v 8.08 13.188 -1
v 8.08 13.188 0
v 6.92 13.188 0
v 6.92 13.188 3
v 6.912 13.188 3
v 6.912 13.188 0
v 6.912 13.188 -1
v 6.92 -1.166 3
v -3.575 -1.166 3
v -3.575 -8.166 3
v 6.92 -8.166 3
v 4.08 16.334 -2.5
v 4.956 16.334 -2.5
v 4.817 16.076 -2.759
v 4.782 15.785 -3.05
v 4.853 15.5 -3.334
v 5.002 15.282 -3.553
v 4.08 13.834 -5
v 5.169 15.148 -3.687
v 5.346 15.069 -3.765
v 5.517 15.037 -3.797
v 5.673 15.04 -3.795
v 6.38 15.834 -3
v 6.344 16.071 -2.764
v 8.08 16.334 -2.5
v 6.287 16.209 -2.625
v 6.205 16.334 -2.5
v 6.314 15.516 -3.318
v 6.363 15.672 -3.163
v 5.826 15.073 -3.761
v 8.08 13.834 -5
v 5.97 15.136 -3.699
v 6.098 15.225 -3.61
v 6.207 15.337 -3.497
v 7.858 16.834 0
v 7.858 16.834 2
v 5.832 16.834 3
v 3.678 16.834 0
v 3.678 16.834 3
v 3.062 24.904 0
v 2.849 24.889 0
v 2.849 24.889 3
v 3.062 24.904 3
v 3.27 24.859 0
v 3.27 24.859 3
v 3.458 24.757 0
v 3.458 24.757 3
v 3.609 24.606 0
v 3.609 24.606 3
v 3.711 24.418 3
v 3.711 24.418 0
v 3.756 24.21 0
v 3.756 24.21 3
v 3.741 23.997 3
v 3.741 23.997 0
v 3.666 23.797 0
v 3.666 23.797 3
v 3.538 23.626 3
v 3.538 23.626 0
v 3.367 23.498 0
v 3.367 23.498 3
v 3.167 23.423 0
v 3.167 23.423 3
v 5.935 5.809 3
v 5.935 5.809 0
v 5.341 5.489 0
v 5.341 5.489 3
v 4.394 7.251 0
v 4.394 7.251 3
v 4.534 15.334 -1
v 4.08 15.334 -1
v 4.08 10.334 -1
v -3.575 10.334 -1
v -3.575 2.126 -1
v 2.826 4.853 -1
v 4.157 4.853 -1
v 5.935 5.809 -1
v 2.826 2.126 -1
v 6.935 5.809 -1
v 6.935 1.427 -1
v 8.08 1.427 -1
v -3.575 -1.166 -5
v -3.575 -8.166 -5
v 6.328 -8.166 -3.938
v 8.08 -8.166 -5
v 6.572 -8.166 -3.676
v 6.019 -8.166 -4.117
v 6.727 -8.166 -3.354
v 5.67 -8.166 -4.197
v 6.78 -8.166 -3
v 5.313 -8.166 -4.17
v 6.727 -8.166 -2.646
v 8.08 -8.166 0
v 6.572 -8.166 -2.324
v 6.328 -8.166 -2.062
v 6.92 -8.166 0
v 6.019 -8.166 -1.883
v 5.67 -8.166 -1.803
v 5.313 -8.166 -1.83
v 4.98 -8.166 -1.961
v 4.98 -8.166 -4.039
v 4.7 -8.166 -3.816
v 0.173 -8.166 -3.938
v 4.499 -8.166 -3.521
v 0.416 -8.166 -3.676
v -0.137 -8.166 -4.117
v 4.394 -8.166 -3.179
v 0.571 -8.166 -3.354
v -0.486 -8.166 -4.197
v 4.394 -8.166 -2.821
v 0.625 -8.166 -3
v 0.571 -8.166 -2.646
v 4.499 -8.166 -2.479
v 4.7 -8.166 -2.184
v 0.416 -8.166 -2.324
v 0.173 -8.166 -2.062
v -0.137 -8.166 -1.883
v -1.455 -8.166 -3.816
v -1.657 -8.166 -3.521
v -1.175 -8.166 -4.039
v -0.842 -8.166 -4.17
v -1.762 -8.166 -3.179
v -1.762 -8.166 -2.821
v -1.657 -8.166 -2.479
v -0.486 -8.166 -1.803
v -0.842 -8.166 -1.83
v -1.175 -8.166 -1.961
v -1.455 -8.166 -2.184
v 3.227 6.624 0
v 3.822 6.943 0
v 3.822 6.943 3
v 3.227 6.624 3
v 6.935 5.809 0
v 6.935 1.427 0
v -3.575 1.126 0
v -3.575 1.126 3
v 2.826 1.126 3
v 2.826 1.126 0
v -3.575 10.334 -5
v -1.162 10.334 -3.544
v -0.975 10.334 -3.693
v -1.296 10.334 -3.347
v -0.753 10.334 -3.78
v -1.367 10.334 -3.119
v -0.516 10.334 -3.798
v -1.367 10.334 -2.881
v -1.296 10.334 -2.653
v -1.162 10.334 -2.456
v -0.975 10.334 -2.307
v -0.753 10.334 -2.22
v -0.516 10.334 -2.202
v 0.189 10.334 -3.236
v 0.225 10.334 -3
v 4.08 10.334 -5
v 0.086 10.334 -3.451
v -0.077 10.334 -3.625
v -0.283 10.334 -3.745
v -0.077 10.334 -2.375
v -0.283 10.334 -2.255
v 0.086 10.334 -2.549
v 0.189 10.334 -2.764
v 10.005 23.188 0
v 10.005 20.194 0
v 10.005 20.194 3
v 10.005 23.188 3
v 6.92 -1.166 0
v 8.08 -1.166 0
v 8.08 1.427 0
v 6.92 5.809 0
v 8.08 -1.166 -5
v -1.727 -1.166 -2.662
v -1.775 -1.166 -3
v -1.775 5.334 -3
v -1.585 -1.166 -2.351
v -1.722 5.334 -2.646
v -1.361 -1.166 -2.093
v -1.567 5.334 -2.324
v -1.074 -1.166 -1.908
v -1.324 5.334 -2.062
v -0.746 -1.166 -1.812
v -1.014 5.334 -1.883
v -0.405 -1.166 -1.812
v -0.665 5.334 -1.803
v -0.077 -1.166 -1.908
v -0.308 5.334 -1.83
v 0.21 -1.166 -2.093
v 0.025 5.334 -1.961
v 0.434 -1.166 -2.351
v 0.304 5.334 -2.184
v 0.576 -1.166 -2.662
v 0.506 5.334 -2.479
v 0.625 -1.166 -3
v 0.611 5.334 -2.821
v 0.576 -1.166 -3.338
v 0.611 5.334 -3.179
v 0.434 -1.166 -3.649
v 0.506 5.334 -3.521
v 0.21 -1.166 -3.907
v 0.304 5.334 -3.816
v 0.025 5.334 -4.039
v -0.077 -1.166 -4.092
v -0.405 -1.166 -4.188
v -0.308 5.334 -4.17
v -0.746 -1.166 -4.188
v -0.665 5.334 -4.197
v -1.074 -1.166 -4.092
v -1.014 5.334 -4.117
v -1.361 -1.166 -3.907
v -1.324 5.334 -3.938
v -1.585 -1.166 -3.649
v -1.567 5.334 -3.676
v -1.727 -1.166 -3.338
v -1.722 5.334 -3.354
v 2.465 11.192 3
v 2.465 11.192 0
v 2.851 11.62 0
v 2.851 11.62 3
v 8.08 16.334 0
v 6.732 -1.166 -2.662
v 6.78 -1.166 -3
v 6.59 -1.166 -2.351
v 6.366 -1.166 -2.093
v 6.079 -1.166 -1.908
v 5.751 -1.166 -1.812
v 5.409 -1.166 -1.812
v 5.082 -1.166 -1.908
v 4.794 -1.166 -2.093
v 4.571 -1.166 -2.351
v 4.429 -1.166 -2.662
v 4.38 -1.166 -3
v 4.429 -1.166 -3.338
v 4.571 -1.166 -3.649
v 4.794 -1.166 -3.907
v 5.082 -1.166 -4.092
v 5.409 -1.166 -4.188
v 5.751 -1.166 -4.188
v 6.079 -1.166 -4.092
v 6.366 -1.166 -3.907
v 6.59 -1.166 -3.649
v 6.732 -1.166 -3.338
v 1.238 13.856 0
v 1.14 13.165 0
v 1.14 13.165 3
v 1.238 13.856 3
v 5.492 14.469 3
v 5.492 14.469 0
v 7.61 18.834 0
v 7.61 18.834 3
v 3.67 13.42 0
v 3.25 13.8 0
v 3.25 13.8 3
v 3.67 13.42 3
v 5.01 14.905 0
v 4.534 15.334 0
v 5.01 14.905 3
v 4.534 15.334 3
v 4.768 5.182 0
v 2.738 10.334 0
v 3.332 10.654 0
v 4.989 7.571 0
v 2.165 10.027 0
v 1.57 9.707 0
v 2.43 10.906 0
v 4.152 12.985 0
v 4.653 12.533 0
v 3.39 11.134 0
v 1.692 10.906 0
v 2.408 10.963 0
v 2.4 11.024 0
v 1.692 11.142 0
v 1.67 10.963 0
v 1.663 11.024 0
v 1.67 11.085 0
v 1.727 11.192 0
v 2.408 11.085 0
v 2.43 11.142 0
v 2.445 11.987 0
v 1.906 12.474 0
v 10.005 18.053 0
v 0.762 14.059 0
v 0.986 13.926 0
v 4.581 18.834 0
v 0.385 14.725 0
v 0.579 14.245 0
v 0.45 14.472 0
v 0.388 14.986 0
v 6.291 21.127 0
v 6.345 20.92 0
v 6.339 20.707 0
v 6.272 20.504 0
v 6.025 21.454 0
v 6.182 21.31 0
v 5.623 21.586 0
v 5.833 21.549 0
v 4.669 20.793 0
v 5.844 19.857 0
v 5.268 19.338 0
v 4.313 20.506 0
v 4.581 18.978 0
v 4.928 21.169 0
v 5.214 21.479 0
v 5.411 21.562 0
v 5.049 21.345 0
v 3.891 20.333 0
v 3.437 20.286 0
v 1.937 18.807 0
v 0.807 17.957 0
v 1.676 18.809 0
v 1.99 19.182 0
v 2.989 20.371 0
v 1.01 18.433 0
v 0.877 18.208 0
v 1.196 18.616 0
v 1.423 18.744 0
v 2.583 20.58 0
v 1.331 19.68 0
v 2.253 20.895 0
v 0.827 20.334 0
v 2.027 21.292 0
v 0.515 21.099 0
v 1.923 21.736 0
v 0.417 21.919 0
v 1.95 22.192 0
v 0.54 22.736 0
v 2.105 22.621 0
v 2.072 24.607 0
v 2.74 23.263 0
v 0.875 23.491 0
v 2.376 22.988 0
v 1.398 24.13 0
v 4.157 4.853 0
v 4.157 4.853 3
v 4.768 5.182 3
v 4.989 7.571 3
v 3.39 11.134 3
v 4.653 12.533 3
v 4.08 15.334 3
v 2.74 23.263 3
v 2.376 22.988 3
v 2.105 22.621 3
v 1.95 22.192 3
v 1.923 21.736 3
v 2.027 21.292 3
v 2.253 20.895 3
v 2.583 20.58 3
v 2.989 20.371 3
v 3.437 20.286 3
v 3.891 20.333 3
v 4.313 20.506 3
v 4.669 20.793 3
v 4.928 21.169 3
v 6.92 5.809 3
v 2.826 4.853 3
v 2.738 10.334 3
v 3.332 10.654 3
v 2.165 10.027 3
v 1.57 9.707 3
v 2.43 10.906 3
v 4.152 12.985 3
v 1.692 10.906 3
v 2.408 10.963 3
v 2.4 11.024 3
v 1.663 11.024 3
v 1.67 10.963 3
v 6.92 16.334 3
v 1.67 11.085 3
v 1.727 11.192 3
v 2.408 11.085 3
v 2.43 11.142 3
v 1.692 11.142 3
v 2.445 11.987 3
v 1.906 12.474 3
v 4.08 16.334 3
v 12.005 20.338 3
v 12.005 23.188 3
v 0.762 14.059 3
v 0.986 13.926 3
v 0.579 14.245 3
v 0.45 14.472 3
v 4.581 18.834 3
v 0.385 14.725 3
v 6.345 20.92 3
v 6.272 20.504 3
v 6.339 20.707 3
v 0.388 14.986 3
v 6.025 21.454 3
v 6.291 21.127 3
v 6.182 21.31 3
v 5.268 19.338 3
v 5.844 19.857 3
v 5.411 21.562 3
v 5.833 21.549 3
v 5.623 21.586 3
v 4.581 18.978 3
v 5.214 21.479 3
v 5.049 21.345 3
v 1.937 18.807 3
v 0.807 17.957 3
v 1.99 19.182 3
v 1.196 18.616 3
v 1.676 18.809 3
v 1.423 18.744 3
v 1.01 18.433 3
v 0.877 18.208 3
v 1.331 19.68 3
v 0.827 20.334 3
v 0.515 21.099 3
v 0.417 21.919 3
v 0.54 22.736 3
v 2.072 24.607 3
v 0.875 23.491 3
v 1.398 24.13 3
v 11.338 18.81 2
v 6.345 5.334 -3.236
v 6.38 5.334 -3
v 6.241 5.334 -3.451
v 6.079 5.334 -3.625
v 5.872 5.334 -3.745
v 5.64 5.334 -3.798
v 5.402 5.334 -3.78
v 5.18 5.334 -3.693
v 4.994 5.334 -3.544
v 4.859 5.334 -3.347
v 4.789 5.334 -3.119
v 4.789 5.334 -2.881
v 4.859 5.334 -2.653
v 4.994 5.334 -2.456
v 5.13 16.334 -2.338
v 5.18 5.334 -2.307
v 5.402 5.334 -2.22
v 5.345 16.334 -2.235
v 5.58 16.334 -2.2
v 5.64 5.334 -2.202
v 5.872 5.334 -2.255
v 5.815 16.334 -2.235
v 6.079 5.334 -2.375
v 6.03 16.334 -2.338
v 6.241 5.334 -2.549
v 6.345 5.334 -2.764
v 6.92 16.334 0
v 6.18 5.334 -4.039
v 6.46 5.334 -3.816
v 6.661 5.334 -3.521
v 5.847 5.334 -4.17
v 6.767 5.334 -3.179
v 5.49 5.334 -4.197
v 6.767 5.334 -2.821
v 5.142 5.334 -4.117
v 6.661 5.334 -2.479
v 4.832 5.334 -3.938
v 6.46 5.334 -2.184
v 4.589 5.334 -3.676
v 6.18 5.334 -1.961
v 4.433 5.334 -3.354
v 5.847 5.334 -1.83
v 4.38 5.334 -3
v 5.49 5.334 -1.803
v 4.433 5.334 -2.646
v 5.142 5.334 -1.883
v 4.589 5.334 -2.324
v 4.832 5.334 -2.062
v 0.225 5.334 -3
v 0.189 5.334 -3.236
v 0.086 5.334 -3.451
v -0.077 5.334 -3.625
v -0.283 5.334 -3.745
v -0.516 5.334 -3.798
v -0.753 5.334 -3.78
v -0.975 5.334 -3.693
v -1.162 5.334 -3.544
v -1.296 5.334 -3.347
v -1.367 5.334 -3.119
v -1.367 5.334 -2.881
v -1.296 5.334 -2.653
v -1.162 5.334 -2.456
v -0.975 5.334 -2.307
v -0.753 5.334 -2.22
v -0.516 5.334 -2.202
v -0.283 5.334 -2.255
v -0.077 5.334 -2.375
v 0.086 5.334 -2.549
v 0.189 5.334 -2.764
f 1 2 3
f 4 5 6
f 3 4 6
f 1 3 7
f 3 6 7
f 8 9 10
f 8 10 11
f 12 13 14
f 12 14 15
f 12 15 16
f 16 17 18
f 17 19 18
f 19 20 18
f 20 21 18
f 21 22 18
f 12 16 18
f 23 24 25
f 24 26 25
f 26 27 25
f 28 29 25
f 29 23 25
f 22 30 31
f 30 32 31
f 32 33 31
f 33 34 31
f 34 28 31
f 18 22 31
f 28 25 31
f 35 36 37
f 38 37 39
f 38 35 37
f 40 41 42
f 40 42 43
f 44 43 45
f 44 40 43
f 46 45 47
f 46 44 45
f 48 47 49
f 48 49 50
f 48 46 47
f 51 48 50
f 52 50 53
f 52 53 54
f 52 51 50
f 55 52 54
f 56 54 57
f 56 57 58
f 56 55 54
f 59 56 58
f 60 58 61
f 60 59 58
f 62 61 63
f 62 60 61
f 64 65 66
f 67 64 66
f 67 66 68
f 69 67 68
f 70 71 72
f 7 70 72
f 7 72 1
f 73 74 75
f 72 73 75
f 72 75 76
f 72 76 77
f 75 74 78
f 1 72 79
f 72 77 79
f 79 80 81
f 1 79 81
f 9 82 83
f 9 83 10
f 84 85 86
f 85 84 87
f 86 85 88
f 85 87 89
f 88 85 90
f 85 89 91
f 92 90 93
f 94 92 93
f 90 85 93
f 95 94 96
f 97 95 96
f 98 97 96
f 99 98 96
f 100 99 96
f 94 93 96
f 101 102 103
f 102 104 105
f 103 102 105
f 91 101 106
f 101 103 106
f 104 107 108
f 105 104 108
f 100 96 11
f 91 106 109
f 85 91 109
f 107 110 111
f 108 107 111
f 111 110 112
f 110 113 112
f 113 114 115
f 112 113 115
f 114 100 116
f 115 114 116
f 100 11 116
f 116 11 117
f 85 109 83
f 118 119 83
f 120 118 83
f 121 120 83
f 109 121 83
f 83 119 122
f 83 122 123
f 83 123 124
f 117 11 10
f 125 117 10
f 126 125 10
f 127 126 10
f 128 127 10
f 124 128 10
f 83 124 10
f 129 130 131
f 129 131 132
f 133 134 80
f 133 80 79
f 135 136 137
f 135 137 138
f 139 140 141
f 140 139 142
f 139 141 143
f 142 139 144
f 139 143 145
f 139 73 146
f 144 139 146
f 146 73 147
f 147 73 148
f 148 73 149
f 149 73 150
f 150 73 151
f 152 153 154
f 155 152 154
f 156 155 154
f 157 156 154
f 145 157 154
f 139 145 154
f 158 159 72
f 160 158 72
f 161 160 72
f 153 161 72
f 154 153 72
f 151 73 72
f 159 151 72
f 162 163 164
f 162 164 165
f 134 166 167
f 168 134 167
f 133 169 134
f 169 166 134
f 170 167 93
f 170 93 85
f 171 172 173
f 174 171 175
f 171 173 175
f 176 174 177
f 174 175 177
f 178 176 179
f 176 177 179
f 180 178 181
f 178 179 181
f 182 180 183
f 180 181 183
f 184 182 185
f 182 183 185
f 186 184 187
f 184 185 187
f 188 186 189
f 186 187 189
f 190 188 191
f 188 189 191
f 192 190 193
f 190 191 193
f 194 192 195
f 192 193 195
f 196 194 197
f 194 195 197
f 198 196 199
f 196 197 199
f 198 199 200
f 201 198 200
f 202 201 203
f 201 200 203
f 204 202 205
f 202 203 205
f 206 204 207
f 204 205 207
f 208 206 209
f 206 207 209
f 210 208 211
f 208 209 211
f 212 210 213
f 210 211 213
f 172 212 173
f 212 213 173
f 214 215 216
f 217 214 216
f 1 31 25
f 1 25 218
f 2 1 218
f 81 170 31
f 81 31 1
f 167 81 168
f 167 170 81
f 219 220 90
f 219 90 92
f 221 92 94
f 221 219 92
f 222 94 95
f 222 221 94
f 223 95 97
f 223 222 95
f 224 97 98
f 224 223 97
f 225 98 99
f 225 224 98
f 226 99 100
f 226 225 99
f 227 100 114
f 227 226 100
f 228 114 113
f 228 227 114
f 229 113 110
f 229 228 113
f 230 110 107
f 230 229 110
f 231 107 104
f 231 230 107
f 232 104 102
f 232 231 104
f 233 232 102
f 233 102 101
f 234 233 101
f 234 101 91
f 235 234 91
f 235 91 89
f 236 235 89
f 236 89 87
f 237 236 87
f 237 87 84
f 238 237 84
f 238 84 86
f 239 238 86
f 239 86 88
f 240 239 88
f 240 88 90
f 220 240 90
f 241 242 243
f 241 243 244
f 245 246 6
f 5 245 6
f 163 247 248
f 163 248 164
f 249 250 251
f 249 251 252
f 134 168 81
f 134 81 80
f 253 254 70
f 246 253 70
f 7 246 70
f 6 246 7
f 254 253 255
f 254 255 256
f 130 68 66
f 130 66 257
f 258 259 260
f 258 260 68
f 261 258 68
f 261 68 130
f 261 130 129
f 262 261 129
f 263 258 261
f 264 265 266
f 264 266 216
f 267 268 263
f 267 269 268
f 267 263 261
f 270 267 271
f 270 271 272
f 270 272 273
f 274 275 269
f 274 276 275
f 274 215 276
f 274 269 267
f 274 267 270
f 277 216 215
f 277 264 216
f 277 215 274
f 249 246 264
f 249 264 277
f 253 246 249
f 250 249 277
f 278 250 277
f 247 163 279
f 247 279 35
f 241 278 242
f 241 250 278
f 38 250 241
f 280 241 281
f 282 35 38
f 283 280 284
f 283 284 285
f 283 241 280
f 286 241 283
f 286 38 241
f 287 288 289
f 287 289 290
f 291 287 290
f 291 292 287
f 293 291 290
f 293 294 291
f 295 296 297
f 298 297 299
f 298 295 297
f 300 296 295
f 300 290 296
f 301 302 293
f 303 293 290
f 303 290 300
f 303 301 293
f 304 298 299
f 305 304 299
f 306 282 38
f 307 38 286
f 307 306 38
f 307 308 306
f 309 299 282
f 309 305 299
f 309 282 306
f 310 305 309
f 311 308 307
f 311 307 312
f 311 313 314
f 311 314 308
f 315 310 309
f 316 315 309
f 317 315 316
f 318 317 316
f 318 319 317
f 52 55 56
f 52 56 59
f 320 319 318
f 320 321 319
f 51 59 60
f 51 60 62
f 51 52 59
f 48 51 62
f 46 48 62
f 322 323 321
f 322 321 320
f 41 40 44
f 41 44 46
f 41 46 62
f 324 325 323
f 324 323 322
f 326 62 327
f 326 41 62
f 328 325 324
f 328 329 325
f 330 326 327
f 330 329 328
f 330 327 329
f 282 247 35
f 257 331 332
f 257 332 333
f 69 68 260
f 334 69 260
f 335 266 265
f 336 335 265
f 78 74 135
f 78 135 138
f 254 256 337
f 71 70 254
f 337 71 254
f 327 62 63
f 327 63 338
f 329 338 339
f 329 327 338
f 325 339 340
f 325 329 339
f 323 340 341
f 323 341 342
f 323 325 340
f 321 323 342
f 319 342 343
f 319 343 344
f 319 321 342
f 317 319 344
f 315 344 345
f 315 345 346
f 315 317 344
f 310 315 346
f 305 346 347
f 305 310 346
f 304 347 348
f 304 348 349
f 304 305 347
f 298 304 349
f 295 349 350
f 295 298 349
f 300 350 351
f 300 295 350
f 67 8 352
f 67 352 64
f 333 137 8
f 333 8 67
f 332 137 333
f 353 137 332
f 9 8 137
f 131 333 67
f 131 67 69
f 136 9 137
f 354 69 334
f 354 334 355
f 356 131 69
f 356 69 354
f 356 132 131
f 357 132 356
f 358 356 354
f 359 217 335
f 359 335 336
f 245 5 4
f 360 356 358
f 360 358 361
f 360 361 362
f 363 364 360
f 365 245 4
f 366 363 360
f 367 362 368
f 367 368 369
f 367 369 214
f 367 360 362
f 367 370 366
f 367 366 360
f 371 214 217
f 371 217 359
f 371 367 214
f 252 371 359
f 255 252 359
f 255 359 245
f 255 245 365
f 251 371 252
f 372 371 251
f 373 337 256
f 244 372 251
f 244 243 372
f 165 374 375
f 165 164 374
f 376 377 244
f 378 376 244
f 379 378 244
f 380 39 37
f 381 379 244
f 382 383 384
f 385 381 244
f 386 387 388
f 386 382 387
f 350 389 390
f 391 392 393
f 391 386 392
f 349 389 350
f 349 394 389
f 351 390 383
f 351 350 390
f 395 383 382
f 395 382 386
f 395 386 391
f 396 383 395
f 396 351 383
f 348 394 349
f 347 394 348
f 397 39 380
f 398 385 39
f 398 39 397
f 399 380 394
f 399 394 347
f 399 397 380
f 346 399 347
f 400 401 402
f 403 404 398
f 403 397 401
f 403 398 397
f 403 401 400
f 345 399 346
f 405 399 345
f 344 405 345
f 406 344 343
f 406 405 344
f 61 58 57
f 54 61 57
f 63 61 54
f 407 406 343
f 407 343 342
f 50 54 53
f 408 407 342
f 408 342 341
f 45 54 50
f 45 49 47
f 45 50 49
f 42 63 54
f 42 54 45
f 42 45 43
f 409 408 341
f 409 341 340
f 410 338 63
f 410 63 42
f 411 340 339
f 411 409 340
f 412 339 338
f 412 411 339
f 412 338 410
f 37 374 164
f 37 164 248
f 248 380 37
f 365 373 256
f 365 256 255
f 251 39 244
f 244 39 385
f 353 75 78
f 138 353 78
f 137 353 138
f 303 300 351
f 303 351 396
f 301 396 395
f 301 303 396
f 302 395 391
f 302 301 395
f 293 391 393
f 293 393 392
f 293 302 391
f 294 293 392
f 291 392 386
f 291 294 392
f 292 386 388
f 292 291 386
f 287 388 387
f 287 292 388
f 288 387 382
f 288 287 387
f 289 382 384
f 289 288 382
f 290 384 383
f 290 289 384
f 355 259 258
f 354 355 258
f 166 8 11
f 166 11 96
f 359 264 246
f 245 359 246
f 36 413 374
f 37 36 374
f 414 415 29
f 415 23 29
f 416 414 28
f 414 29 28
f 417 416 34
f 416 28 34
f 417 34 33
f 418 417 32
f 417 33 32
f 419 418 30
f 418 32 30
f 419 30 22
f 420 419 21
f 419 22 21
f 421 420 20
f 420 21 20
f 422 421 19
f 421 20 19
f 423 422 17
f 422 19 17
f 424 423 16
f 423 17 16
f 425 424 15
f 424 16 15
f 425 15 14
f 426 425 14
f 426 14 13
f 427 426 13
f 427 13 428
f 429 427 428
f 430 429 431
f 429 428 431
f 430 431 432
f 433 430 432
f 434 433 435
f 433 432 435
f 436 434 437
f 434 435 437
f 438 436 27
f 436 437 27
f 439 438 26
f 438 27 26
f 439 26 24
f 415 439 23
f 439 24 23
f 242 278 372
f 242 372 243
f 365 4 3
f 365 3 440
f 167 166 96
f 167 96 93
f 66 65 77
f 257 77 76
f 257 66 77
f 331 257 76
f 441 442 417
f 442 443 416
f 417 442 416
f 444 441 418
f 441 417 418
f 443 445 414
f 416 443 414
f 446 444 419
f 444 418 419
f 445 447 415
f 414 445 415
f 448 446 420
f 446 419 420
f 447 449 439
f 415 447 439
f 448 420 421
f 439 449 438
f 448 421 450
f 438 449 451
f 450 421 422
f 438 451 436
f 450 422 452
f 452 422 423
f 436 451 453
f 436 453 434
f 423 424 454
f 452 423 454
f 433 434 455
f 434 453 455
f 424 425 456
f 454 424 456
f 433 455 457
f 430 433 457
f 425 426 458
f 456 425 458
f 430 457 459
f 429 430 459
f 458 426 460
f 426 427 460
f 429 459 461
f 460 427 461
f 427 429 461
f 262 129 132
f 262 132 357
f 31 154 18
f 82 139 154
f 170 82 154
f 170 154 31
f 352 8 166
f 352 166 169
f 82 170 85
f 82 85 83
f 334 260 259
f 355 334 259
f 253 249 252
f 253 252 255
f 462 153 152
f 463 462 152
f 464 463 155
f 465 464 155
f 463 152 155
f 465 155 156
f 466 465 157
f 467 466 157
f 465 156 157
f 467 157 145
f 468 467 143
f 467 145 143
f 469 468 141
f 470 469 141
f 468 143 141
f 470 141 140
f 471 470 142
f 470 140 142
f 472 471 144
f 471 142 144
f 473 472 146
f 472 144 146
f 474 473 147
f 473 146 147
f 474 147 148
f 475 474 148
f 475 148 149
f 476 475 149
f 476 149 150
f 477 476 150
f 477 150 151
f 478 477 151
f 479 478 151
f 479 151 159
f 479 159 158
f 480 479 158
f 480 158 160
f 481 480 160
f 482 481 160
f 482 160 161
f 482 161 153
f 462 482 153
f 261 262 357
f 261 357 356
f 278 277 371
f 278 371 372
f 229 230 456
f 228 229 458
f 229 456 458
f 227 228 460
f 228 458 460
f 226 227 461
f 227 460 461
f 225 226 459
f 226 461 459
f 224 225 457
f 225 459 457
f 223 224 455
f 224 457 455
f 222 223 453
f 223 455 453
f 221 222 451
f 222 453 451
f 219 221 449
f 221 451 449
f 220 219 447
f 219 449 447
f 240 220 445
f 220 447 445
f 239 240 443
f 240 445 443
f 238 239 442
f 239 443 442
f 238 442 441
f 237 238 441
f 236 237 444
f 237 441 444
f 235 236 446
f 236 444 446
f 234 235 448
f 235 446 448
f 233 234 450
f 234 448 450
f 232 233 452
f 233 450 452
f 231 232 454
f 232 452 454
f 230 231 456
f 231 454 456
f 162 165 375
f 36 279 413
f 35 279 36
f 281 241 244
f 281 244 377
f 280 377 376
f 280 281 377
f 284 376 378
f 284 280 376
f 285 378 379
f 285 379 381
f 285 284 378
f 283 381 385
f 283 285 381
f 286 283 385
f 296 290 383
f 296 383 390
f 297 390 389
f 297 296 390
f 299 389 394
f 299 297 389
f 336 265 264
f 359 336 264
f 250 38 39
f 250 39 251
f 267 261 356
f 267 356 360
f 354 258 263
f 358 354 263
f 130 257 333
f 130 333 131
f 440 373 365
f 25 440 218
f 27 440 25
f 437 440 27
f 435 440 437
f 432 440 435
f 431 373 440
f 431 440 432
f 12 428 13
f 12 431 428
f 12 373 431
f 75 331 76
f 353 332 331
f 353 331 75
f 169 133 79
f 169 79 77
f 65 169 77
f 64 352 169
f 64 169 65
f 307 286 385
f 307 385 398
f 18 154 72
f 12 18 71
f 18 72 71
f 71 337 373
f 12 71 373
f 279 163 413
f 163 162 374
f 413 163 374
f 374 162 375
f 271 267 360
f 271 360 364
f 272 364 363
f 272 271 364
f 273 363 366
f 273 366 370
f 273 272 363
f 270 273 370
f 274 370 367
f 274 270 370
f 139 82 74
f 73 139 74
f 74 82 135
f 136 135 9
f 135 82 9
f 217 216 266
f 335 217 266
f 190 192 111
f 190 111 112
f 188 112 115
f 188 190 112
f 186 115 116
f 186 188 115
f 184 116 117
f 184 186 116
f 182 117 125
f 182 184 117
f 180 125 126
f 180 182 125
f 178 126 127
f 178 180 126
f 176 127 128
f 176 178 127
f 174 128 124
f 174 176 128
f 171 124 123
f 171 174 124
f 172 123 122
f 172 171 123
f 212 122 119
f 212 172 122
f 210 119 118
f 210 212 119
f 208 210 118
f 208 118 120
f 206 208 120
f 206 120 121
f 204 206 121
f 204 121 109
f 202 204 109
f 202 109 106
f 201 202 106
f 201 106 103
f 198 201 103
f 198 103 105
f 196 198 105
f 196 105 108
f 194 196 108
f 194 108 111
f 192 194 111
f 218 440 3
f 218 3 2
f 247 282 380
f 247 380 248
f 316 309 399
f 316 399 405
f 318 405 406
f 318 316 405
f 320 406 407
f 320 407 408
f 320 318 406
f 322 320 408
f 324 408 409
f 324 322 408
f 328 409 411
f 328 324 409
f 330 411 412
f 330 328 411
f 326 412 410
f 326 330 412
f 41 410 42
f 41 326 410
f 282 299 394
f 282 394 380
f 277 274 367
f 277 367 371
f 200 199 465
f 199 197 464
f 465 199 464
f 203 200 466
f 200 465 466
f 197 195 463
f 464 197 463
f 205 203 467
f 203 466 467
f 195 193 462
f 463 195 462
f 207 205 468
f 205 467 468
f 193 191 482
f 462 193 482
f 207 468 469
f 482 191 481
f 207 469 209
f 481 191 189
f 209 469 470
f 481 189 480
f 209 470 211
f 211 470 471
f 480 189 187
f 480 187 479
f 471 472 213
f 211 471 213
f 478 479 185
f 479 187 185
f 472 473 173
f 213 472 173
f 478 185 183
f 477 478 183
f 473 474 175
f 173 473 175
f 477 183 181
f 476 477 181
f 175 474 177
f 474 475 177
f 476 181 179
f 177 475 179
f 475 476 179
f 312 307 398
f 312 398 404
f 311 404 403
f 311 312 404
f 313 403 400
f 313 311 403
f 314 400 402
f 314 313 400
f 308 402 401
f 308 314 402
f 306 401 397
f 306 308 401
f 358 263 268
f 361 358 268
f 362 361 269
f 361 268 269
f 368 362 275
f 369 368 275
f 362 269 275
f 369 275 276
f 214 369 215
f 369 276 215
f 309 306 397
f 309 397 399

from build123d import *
from build123d.topology import SkipClean

# Parameters (mm, degrees)
BOSS_SWITCH_BODY_DEPTH                = 3
SKETCH1_W                             = 4
SKETCH1_H                             = 3.146726578
BOSS_FLANGE_WIDTH_DEPTH               = 5
BOSS_FLANGE_HEIGHT_REACH              = 32.536
SKETCH2_W                             = 4
SKETCH2_H                             = 3.146726578
SKETCH2_W_2                           = 8
SKETCH2_H_2                           = 2.29195361
SKETCH17_W                            = 11.655585698
SKETCH17_H                            = 4
BOSS_FLANGE_SUPPORT_DEPTH             = 12.061319812
CUT_WALL_GAP_DEPTH                    = 1
SKETCH26_W                            = 7.655585698
SKETCH26_H                            = 6
CUT_CAM_SLOPE_CLEARANCE_DEPTH         = 29.549094119
TAP_DRILL_FOR_M2X0_4_TAP1_D           = 1.6
M2_CLEARANCE_HOLE2_D                  = 2.4
M2_CLEARANCE_HOLE2_DEPTH              = 6.5
CUT_UP_TO_DOWN_CANTILEVER_SLOPE_REACH = 30.228
CHAMFER_FLANGE_SUPPORT_3_SIZE         = 1
CHAMFER7_SIZE                         = 1
SKETCH25_W                            = 6.448372016
SKETCH25_H                            = 17.5
CUT_BASE_REMOVAL_DEPTH                = 3
CHAMFER8_SIZE                         = 2.5
SKETCH28_R                            = 1.2
BOSS_REAR_FILL_DEPTH                  = 7


with BuildPart() as part:
    # Sketch-SwitchBossUp → Boss-Switch Body (new body)
    with BuildSketch(Plane.XY):
        with BuildLine():
            Line((10.004529844, 20.193518123), (10.004529844, 23.188250119))
            Line((10.004529844, 23.188250119), (12.004529844, 23.188250119))
            Line((12.004529844, 23.188250119), (12.004529844, 19.188250119))
            Line((12.004529844, 19.188250119), (7.857869287, 16.834427149))
            Line((7.857869287, 16.834427149), (3.678301726, 16.834427149))
            Line((3.678301726, 16.834427149), (3.249751742, 13.799610523))
            Line((3.249751742, 13.799610523), (3.669750435, 13.420459172))
            Line((3.669750435, 13.420459172), (5.009929091, 14.905020107))
            Line((5.009929091, 14.905020107), (4.534260481, 15.334427149))
            Line((4.534260481, 15.334427149), (4.080115542, 15.334427149))
            Line((4.080115542, 15.334427149), (4.080115542, 16.334427149))
            Line((4.080115542, 16.334427149), (7.056733116, 16.334427149))
            Line((7.056733116, 16.334427149), (13.368774055, 16.334427149))
            Line((13.368774055, 16.334427149), (13.368774055, -1.165572851))
            Line((13.368774055, -1.165572851), (5.219466869, -1.165572851))
            Line((5.219466869, -1.165572851), (3.260297574, -1.165572851))
            Line((3.260297574, -1.165572851), (3.260297574, 1.126380759))
            Line((3.260297574, 1.126380759), (2.82580452, 1.126380759))
            Line((2.82580452, 1.126380759), (2.82580452, 4.353442062))
            Line((2.82580452, 4.353442062), (2.82580452, 4.853442062))
            Line((2.82580452, 4.853442062), (4.157214411, 4.853442062))
            Line((4.157214411, 4.853442062), (4.768160192, 5.181708905))
            Line((4.768160192, 5.181708905), (3.821534656, 6.943497796))
            Line((3.821534656, 6.943497796), (3.226930905, 6.624011677))
            Line((3.226930905, 6.624011677), (1.570336216, 9.707142235))
            Line((1.570336216, 9.707142235), (2.164939967, 10.026628353))
            Line((2.164939967, 10.026628353), (1.692327837, 10.906218823))
            ThreePointArc((1.692327837, 10.906218823), (1.664368515, 11.054634089), (1.726981331, 11.192069347))
            Line((1.726981331, 11.192069347), (2.444726799, 11.987140122))
            Line((2.444726799, 11.987140122), (1.905726754, 12.473719244))
            Line((1.905726754, 12.473719244), (1.140258894, 13.164740854))
            Line((1.140258894, 13.164740854), (1.237885501, 13.856092765))
            ThreePointArc((1.237885501, 13.856092765), (0.578678558, 14.244979181), (0.38753308, 14.986093101))
            Line((0.38753308, 14.986093101), (0.807004952, 17.956622238))
            ThreePointArc((0.807004952, 17.956622238), (1.195891368, 18.61582918), (1.937005288, 18.806974659))
            Line((1.937005288, 18.806974659), (1.989924178, 19.181724706))
            ThreePointArc((1.989924178, 19.181724706), (0.451399887, 22.331599998), (2.848737223, 24.889244431))
            ThreePointArc((2.848737223, 24.889244431), (3.740925778, 24.315659579), (3.167340926, 23.423471024))
            ThreePointArc((3.167340926, 23.423471024), (2.253195858, 20.895301387), (4.927625811, 21.168664412))
            ThreePointArc((4.927625811, 21.168664412), (5.932330877, 21.508616953), (6.272283418, 20.503911887))
            ThreePointArc((6.272283418, 20.503911887), (5.572480513, 19.579545857), (4.581080915, 18.978460587))
            Line((4.581080915, 18.978460587), (4.581080915, 18.834427149))
            Line((4.581080915, 18.834427149), (7.610259328, 18.834427149))
            Line((7.610259328, 18.834427149), (10.004529844, 20.193518123))
        make_face()
        with BuildLine():
            Line((3.332125106, 10.653767771), (2.737521356, 10.334281653))
            Line((2.737521356, 10.334281653), (2.430214202, 10.906218823))
            ThreePointArc((2.430214202, 10.906218823), (2.40225488, 11.054634089), (2.464867696, 11.192069347))
            Line((2.464867696, 11.192069347), (2.851287644, 11.620119709))
            Line((2.851287644, 11.620119709), (3.390287689, 11.133540588))
            Line((3.390287689, 11.133540588), (4.653272054, 12.532590813))
            Line((4.653272054, 12.532590813), (4.152232739, 12.984901109))
            Line((4.152232739, 12.984901109), (5.492411395, 14.469462044))
            Line((5.492411395, 14.469462044), (6.912261653, 13.187700571))
            Line((6.912261653, 13.187700571), (10.437466736, 13.187700571))
            Line((10.437466736, 13.187700571), (10.437466736, 2.560049805))
            Line((10.437466736, 2.560049805), (9.303967163, 1.426550232))
            Line((9.303967163, 1.426550232), (6.935345332, 1.426550232))
            Line((6.935345332, 1.426550232), (6.935345332, 5.808848323))
            Line((6.935345332, 5.808848323), (5.935345332, 5.808848323))
            Line((5.935345332, 5.808848323), (5.340741582, 5.489362205))
            Line((5.340741582, 5.489362205), (4.394116045, 7.251151095))
            Line((4.394116045, 7.251151095), (4.988719795, 7.570637214))
            Line((4.988719795, 7.570637214), (3.332125106, 10.653767771))
        make_face(mode=Mode.SUBTRACT)
    extrude(amount=BOSS_SWITCH_BODY_DEPTH)

    # Sketch1 → Boss-Flange Width (add)
    with BuildSketch(Plane(origin=(0, 0, 0), x_dir=(-1, 0, 0), z_dir=(0, 0, -1))):
        Polygon((-6.935345332, 5.808848323), (-5.935345332, 5.808848323), (-4.157214411, 4.853442062), (-2.82580452, 4.853442062), (-2.82580452, 1.126380759), (0.412170615, 1.126380759), (0.412170615, -1.165572851), (-8.080115542, -1.165572851), (-8.080115542, 1.426550232), (-6.935345332, 1.426550232), align=None)
        with Locations((-6.080115542, 14.76106386)):
            Rectangle(SKETCH1_W, SKETCH1_H)
    extrude(amount=BOSS_FLANGE_WIDTH_DEPTH)

    # Sketch2 → Boss-Flange Height (add, up to next)
    with BuildSketch(Plane(origin=(-3.575470156, 0, 0), x_dir=(0, 0, -1), z_dir=(1, 0, 0)), mode=Mode.PRIVATE) as boss_flange_height_sk1:
        with Locations((3, 14.76106386)):
            Rectangle(SKETCH2_W, SKETCH2_H)
    boss_flange_height_tool1 = extrude(boss_flange_height_sk1.sketch, amount=BOSS_FLANGE_HEIGHT_REACH, mode=Mode.PRIVATE) - part.part
    # Sketch2 → Boss-Flange Height (add, up to next)
    with BuildSketch(Plane(origin=(-3.575470156, 0, 0), x_dir=(0, 0, -1), z_dir=(1, 0, 0)), mode=Mode.PRIVATE) as boss_flange_height_sk2:
        with Locations((1, -0.019596046)):
            Rectangle(SKETCH2_W_2, SKETCH2_H_2)
    boss_flange_height_tool2 = extrude(boss_flange_height_sk2.sketch, amount=BOSS_FLANGE_HEIGHT_REACH, mode=Mode.PRIVATE) - part.part
    add(boss_flange_height_tool1.solids().sort_by_distance((-3.57547, 14.761064, -3))[0])
    add(boss_flange_height_tool2.solids().sort_by_distance((-3.57547, -0.019596, -1))[0])

    # Sketch17 → Boss-Flange Support (add)
    with BuildSketch(Plane.XZ.offset(-1.126380759)):
        with Locations((2.252322693, -3)):
            Rectangle(SKETCH17_W, SKETCH17_H)
    extrude(amount=-BOSS_FLANGE_SUPPORT_DEPTH)

    # Sketch27 → Cut-Wall Gap (cut)
    with BuildSketch(Plane.XY):
        Polygon((4.080115542, 15.334427149), (4.534260481, 15.334427149), (6.912261653, 13.187700571), (4.080115542, 13.187700571), align=None)
    extrude(amount=-CUT_WALL_GAP_DEPTH, mode=Mode.SUBTRACT)

    # Sketch26 → Cut-Cam Slope Clearance (cut, through all)
    with BuildSketch(Plane.XY.offset(-1)):
        with Locations((0.252322693, 13.334427149)):
            Rectangle(SKETCH26_W, SKETCH26_H)
    extrude(amount=-CUT_CAM_SLOPE_CLEARANCE_DEPTH, mode=Mode.SUBTRACT)

    # Tap Drill for M2x0.4 Tap1 (through all)
    with Locations(Plane(origin=(0, -1.165572851, 0), x_dir=(-1, 0, 0), z_dir=(0, -1, 0))):
        with Locations((0.575470156, 3), (-5.580115542, 3)):
            Hole(TAP_DRILL_FOR_M2X0_4_TAP1_D / 2)

    # M2 Clearance Hole2
    with Locations(Plane.XZ.offset(1.165572851)):
        with Locations((-0.575470156, -3), (5.580115542, -3)):
            Hole(M2_CLEARANCE_HOLE2_D / 2, depth=M2_CLEARANCE_HOLE2_DEPTH)

    # Sketch12 → Cut-Up-to-Down Cantilever Slope (cut, up to next)
    with BuildSketch(Plane(origin=(0, 23.188250119, 0), x_dir=(1, 0, 0), z_dir=(0, 1, 0)), mode=Mode.PRIVATE) as cut_up_to_down_cantilever_slope_sk1:
        Polygon((10.004529844, 0), (12.004529844, -3), (12.004529844, 0), align=None)
    cut_up_to_down_cantilever_slope_tool1 = extrude(cut_up_to_down_cantilever_slope_sk1.sketch, amount=-CUT_UP_TO_DOWN_CANTILEVER_SLOPE_REACH, mode=Mode.PRIVATE) & part.part
    add(cut_up_to_down_cantilever_slope_tool1.solids().sort_by_distance((11.337863, 23.18825, 1))[0], mode=Mode.SUBTRACT)

    # Chamfer-Flange Support 3
    chamfer_flange_support_3_edges = [part.edges().sort_by_distance(p)[0] for p in [
        (-0.374832818, 1.126380759, -1),
    ]]
    chamfer(chamfer_flange_support_3_edges, length=CHAMFER_FLANGE_SUPPORT_3_SIZE)

    # Chamfer7
    chamfer7_edges = [part.edges().sort_by_distance(p)[0] for p in [
        (9.931199565, 18.011338634, 3),
    ]]
    chamfer(chamfer7_edges, length=CHAMFER7_SIZE)

    # Sketch25 → Cut-Base Removal (cut)
    with BuildSketch(Plane.XY.offset(3)):
        with Locations((10.144588047, 7.584427149)):
            Rectangle(SKETCH25_W, SKETCH25_H)
    extrude(amount=-CUT_BASE_REMOVAL_DEPTH, mode=Mode.SUBTRACT)

    # Chamfer8
    # the kernel refuses this chamfer: 2.5 mm, written as the material it takes off along each edge
    with BuildSketch(Plane(origin=(14.509323012, 16.334427149, -5), x_dir=(0, 0.027495876610586317, 0.9996219169112968), z_dir=(-1, 0, 0))) as chamfer8_piece_1:
        Polygon((CHAMFER8_SIZE * 0.999621916911, -CHAMFER8_SIZE * 0.0274958766106), (-CHAMFER8_SIZE * 0.0274958766106, -CHAMFER8_SIZE * 0.999621916911), (0, 0), align=None)
    extrude(amount=16.85841494, mode=Mode.SUBTRACT)

    # Sketch28 → Boss-Rear Fill (add)
    with SkipClean():  # the faces are left unmerged after this step: merging them gives an invalid solid
        with BuildSketch(Plane.XZ.offset(1.165572851)):
            Polygon((-3.575470156, 3), (6.920402039, 3), (6.920402039, 0), (8.080115542, 0), (8.080115542, -5), (-3.575470156, -5), align=None)
            with Locations((5.580115542, -3)):
                Circle(SKETCH28_R, mode=Mode.SUBTRACT)
            with Locations((-0.575470156, -3)):
                Circle(SKETCH28_R, mode=Mode.SUBTRACT)
        extrude(amount=BOSS_REAR_FILL_DEPTH)


solid = part.part
